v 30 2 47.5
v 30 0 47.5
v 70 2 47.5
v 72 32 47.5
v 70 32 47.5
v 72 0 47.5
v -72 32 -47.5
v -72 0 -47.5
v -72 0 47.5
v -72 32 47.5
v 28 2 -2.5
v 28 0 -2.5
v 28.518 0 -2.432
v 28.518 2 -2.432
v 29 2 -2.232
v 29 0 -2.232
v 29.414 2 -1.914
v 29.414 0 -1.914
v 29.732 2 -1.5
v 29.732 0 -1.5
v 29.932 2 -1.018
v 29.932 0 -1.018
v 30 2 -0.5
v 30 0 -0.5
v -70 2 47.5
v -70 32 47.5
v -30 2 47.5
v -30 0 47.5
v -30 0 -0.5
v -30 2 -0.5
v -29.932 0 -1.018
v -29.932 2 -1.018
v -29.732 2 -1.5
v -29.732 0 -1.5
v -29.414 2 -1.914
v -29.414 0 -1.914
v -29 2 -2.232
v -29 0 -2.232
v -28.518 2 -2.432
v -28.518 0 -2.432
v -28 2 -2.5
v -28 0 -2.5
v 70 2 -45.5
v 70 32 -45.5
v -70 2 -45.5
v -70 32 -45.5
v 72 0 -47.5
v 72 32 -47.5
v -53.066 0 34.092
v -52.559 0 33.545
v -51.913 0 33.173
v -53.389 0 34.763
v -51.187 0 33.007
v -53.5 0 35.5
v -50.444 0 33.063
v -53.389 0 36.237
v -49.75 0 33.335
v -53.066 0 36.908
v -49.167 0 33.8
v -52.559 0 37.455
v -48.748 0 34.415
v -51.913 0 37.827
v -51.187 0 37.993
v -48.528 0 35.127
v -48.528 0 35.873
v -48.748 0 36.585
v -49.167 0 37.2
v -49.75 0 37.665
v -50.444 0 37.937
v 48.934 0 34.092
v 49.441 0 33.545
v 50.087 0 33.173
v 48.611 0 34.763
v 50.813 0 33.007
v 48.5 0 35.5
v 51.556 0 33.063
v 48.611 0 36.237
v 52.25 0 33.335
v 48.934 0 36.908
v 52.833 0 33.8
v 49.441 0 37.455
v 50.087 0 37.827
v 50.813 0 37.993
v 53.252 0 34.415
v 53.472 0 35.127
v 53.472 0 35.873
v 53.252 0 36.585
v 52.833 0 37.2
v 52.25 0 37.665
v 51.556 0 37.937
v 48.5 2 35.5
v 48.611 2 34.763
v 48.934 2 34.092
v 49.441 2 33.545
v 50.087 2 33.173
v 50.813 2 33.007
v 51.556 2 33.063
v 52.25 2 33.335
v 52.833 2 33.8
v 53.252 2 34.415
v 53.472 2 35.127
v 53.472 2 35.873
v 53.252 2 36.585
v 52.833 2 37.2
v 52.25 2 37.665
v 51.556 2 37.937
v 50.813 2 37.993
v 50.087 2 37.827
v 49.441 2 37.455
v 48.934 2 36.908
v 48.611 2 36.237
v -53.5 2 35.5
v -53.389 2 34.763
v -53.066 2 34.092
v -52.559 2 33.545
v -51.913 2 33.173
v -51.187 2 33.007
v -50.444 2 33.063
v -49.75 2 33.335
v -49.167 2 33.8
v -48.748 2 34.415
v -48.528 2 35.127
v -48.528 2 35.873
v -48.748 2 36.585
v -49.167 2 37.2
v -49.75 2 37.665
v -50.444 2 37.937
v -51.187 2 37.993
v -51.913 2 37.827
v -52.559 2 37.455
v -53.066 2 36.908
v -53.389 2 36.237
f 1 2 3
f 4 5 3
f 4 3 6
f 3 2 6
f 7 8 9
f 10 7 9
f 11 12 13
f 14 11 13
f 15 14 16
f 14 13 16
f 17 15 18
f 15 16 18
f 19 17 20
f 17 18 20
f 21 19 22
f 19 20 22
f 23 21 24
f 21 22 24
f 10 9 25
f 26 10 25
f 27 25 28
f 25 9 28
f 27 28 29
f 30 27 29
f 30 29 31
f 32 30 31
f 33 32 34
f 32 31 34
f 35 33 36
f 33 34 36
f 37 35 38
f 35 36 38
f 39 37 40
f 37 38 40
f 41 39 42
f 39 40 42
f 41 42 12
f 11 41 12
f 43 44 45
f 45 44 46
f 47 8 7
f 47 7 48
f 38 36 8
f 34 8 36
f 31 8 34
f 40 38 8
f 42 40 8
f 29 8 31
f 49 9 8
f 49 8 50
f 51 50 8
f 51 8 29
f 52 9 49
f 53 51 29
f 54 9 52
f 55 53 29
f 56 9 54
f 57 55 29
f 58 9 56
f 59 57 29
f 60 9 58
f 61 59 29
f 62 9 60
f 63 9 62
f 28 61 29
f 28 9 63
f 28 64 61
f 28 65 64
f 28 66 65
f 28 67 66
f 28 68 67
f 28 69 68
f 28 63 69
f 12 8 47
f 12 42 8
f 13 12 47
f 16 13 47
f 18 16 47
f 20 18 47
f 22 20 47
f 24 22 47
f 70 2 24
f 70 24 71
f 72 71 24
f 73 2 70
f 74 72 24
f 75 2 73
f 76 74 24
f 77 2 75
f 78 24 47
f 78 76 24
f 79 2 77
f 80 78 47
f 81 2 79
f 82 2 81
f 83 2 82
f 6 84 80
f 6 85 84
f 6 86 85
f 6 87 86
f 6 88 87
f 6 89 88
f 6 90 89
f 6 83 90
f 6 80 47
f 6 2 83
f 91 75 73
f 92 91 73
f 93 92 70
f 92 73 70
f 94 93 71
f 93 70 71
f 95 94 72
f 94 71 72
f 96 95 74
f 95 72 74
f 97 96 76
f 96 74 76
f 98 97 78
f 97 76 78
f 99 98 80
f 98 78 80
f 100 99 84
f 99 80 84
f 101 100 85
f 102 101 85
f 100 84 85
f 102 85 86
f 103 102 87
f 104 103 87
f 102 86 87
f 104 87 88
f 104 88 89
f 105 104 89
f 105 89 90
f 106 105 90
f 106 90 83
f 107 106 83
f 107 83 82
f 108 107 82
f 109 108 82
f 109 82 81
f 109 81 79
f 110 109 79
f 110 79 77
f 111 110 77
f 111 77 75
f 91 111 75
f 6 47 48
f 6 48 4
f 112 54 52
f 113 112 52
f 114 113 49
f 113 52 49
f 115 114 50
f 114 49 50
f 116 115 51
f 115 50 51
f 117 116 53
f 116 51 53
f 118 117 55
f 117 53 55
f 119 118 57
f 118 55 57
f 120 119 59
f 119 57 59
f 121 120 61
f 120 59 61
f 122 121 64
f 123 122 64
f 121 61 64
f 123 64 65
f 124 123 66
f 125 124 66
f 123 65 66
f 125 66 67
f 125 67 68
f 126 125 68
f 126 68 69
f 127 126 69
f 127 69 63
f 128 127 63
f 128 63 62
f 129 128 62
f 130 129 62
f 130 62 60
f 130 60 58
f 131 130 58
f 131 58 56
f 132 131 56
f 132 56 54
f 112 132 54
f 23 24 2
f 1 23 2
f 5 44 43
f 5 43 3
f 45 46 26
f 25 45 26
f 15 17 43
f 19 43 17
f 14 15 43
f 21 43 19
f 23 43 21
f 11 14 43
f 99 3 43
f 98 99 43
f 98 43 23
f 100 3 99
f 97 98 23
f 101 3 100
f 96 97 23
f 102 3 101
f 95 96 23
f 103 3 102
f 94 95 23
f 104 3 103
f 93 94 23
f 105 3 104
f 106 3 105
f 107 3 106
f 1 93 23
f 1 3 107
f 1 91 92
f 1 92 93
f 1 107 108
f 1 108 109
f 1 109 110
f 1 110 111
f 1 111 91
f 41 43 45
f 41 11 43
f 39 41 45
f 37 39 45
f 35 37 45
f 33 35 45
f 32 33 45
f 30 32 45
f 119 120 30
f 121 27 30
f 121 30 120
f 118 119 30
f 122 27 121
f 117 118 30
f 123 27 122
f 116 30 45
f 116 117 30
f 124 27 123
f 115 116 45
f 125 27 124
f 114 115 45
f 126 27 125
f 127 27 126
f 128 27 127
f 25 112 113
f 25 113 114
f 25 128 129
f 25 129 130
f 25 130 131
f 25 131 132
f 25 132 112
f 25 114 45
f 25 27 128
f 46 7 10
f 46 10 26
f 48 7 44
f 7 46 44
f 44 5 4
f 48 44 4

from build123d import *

# Parameters (mm, degrees)
SKETCH_1_W            = 144
SKETCH_1_H            = 95
EXTRUDE_1_DEPTH       = 32
SKETCH_2_W            = 140
SKETCH_2_H            = 93
CUT_EXTRUDE_1_DEPTH   = 30
CUT_EXTRUDE_2_DEPTH   = 93.001358686
HOLE_WIZARD_5_0_5_1_D = 5


with BuildPart() as part:
    # 草图1 → 凸台-拉伸1 (new body)
    with BuildSketch(Plane.XZ):
        Rectangle(SKETCH_1_W, SKETCH_1_H)
    extrude(amount=-EXTRUDE_1_DEPTH)

    # 草图2 → 切除-拉伸1 (cut)
    with BuildSketch(Plane(origin=(0, 32, 0), x_dir=(-1, 0, 0), z_dir=(0, 1, 0))):
        with Locations((0, 1)):
            Rectangle(SKETCH_2_W, SKETCH_2_H)
    extrude(amount=-CUT_EXTRUDE_1_DEPTH, mode=Mode.SUBTRACT)

    # 草图3 → 切除-拉伸2 (cut, through all)
    with BuildSketch(Plane.XZ):
        with BuildLine():
            Line((30, 47.5), (-30, 47.5))
            Line((-30, 47.5), (-30, -0.5))
            ThreePointArc((-30, -0.5), (-29.414213562, -1.914213562), (-28, -2.5))
            Line((-28, -2.5), (28, -2.5))
            ThreePointArc((28, -2.5), (29.414213562, -1.914213562), (30, -0.5))
            Line((30, -0.5), (30, 47.5))
        make_face()
    extrude(amount=-CUT_EXTRUDE_2_DEPTH, mode=Mode.SUBTRACT)

    # Ø5.0 (5) 直径孔1 (through all)
    with Locations(Plane(origin=(0, 2, 0), x_dir=(1, 0, 0), z_dir=(0, 1, 0))):
        with Locations((51, -35.5), (-51, -35.5)):
            Hole(HOLE_WIZARD_5_0_5_1_D / 2)


solid = part.part
